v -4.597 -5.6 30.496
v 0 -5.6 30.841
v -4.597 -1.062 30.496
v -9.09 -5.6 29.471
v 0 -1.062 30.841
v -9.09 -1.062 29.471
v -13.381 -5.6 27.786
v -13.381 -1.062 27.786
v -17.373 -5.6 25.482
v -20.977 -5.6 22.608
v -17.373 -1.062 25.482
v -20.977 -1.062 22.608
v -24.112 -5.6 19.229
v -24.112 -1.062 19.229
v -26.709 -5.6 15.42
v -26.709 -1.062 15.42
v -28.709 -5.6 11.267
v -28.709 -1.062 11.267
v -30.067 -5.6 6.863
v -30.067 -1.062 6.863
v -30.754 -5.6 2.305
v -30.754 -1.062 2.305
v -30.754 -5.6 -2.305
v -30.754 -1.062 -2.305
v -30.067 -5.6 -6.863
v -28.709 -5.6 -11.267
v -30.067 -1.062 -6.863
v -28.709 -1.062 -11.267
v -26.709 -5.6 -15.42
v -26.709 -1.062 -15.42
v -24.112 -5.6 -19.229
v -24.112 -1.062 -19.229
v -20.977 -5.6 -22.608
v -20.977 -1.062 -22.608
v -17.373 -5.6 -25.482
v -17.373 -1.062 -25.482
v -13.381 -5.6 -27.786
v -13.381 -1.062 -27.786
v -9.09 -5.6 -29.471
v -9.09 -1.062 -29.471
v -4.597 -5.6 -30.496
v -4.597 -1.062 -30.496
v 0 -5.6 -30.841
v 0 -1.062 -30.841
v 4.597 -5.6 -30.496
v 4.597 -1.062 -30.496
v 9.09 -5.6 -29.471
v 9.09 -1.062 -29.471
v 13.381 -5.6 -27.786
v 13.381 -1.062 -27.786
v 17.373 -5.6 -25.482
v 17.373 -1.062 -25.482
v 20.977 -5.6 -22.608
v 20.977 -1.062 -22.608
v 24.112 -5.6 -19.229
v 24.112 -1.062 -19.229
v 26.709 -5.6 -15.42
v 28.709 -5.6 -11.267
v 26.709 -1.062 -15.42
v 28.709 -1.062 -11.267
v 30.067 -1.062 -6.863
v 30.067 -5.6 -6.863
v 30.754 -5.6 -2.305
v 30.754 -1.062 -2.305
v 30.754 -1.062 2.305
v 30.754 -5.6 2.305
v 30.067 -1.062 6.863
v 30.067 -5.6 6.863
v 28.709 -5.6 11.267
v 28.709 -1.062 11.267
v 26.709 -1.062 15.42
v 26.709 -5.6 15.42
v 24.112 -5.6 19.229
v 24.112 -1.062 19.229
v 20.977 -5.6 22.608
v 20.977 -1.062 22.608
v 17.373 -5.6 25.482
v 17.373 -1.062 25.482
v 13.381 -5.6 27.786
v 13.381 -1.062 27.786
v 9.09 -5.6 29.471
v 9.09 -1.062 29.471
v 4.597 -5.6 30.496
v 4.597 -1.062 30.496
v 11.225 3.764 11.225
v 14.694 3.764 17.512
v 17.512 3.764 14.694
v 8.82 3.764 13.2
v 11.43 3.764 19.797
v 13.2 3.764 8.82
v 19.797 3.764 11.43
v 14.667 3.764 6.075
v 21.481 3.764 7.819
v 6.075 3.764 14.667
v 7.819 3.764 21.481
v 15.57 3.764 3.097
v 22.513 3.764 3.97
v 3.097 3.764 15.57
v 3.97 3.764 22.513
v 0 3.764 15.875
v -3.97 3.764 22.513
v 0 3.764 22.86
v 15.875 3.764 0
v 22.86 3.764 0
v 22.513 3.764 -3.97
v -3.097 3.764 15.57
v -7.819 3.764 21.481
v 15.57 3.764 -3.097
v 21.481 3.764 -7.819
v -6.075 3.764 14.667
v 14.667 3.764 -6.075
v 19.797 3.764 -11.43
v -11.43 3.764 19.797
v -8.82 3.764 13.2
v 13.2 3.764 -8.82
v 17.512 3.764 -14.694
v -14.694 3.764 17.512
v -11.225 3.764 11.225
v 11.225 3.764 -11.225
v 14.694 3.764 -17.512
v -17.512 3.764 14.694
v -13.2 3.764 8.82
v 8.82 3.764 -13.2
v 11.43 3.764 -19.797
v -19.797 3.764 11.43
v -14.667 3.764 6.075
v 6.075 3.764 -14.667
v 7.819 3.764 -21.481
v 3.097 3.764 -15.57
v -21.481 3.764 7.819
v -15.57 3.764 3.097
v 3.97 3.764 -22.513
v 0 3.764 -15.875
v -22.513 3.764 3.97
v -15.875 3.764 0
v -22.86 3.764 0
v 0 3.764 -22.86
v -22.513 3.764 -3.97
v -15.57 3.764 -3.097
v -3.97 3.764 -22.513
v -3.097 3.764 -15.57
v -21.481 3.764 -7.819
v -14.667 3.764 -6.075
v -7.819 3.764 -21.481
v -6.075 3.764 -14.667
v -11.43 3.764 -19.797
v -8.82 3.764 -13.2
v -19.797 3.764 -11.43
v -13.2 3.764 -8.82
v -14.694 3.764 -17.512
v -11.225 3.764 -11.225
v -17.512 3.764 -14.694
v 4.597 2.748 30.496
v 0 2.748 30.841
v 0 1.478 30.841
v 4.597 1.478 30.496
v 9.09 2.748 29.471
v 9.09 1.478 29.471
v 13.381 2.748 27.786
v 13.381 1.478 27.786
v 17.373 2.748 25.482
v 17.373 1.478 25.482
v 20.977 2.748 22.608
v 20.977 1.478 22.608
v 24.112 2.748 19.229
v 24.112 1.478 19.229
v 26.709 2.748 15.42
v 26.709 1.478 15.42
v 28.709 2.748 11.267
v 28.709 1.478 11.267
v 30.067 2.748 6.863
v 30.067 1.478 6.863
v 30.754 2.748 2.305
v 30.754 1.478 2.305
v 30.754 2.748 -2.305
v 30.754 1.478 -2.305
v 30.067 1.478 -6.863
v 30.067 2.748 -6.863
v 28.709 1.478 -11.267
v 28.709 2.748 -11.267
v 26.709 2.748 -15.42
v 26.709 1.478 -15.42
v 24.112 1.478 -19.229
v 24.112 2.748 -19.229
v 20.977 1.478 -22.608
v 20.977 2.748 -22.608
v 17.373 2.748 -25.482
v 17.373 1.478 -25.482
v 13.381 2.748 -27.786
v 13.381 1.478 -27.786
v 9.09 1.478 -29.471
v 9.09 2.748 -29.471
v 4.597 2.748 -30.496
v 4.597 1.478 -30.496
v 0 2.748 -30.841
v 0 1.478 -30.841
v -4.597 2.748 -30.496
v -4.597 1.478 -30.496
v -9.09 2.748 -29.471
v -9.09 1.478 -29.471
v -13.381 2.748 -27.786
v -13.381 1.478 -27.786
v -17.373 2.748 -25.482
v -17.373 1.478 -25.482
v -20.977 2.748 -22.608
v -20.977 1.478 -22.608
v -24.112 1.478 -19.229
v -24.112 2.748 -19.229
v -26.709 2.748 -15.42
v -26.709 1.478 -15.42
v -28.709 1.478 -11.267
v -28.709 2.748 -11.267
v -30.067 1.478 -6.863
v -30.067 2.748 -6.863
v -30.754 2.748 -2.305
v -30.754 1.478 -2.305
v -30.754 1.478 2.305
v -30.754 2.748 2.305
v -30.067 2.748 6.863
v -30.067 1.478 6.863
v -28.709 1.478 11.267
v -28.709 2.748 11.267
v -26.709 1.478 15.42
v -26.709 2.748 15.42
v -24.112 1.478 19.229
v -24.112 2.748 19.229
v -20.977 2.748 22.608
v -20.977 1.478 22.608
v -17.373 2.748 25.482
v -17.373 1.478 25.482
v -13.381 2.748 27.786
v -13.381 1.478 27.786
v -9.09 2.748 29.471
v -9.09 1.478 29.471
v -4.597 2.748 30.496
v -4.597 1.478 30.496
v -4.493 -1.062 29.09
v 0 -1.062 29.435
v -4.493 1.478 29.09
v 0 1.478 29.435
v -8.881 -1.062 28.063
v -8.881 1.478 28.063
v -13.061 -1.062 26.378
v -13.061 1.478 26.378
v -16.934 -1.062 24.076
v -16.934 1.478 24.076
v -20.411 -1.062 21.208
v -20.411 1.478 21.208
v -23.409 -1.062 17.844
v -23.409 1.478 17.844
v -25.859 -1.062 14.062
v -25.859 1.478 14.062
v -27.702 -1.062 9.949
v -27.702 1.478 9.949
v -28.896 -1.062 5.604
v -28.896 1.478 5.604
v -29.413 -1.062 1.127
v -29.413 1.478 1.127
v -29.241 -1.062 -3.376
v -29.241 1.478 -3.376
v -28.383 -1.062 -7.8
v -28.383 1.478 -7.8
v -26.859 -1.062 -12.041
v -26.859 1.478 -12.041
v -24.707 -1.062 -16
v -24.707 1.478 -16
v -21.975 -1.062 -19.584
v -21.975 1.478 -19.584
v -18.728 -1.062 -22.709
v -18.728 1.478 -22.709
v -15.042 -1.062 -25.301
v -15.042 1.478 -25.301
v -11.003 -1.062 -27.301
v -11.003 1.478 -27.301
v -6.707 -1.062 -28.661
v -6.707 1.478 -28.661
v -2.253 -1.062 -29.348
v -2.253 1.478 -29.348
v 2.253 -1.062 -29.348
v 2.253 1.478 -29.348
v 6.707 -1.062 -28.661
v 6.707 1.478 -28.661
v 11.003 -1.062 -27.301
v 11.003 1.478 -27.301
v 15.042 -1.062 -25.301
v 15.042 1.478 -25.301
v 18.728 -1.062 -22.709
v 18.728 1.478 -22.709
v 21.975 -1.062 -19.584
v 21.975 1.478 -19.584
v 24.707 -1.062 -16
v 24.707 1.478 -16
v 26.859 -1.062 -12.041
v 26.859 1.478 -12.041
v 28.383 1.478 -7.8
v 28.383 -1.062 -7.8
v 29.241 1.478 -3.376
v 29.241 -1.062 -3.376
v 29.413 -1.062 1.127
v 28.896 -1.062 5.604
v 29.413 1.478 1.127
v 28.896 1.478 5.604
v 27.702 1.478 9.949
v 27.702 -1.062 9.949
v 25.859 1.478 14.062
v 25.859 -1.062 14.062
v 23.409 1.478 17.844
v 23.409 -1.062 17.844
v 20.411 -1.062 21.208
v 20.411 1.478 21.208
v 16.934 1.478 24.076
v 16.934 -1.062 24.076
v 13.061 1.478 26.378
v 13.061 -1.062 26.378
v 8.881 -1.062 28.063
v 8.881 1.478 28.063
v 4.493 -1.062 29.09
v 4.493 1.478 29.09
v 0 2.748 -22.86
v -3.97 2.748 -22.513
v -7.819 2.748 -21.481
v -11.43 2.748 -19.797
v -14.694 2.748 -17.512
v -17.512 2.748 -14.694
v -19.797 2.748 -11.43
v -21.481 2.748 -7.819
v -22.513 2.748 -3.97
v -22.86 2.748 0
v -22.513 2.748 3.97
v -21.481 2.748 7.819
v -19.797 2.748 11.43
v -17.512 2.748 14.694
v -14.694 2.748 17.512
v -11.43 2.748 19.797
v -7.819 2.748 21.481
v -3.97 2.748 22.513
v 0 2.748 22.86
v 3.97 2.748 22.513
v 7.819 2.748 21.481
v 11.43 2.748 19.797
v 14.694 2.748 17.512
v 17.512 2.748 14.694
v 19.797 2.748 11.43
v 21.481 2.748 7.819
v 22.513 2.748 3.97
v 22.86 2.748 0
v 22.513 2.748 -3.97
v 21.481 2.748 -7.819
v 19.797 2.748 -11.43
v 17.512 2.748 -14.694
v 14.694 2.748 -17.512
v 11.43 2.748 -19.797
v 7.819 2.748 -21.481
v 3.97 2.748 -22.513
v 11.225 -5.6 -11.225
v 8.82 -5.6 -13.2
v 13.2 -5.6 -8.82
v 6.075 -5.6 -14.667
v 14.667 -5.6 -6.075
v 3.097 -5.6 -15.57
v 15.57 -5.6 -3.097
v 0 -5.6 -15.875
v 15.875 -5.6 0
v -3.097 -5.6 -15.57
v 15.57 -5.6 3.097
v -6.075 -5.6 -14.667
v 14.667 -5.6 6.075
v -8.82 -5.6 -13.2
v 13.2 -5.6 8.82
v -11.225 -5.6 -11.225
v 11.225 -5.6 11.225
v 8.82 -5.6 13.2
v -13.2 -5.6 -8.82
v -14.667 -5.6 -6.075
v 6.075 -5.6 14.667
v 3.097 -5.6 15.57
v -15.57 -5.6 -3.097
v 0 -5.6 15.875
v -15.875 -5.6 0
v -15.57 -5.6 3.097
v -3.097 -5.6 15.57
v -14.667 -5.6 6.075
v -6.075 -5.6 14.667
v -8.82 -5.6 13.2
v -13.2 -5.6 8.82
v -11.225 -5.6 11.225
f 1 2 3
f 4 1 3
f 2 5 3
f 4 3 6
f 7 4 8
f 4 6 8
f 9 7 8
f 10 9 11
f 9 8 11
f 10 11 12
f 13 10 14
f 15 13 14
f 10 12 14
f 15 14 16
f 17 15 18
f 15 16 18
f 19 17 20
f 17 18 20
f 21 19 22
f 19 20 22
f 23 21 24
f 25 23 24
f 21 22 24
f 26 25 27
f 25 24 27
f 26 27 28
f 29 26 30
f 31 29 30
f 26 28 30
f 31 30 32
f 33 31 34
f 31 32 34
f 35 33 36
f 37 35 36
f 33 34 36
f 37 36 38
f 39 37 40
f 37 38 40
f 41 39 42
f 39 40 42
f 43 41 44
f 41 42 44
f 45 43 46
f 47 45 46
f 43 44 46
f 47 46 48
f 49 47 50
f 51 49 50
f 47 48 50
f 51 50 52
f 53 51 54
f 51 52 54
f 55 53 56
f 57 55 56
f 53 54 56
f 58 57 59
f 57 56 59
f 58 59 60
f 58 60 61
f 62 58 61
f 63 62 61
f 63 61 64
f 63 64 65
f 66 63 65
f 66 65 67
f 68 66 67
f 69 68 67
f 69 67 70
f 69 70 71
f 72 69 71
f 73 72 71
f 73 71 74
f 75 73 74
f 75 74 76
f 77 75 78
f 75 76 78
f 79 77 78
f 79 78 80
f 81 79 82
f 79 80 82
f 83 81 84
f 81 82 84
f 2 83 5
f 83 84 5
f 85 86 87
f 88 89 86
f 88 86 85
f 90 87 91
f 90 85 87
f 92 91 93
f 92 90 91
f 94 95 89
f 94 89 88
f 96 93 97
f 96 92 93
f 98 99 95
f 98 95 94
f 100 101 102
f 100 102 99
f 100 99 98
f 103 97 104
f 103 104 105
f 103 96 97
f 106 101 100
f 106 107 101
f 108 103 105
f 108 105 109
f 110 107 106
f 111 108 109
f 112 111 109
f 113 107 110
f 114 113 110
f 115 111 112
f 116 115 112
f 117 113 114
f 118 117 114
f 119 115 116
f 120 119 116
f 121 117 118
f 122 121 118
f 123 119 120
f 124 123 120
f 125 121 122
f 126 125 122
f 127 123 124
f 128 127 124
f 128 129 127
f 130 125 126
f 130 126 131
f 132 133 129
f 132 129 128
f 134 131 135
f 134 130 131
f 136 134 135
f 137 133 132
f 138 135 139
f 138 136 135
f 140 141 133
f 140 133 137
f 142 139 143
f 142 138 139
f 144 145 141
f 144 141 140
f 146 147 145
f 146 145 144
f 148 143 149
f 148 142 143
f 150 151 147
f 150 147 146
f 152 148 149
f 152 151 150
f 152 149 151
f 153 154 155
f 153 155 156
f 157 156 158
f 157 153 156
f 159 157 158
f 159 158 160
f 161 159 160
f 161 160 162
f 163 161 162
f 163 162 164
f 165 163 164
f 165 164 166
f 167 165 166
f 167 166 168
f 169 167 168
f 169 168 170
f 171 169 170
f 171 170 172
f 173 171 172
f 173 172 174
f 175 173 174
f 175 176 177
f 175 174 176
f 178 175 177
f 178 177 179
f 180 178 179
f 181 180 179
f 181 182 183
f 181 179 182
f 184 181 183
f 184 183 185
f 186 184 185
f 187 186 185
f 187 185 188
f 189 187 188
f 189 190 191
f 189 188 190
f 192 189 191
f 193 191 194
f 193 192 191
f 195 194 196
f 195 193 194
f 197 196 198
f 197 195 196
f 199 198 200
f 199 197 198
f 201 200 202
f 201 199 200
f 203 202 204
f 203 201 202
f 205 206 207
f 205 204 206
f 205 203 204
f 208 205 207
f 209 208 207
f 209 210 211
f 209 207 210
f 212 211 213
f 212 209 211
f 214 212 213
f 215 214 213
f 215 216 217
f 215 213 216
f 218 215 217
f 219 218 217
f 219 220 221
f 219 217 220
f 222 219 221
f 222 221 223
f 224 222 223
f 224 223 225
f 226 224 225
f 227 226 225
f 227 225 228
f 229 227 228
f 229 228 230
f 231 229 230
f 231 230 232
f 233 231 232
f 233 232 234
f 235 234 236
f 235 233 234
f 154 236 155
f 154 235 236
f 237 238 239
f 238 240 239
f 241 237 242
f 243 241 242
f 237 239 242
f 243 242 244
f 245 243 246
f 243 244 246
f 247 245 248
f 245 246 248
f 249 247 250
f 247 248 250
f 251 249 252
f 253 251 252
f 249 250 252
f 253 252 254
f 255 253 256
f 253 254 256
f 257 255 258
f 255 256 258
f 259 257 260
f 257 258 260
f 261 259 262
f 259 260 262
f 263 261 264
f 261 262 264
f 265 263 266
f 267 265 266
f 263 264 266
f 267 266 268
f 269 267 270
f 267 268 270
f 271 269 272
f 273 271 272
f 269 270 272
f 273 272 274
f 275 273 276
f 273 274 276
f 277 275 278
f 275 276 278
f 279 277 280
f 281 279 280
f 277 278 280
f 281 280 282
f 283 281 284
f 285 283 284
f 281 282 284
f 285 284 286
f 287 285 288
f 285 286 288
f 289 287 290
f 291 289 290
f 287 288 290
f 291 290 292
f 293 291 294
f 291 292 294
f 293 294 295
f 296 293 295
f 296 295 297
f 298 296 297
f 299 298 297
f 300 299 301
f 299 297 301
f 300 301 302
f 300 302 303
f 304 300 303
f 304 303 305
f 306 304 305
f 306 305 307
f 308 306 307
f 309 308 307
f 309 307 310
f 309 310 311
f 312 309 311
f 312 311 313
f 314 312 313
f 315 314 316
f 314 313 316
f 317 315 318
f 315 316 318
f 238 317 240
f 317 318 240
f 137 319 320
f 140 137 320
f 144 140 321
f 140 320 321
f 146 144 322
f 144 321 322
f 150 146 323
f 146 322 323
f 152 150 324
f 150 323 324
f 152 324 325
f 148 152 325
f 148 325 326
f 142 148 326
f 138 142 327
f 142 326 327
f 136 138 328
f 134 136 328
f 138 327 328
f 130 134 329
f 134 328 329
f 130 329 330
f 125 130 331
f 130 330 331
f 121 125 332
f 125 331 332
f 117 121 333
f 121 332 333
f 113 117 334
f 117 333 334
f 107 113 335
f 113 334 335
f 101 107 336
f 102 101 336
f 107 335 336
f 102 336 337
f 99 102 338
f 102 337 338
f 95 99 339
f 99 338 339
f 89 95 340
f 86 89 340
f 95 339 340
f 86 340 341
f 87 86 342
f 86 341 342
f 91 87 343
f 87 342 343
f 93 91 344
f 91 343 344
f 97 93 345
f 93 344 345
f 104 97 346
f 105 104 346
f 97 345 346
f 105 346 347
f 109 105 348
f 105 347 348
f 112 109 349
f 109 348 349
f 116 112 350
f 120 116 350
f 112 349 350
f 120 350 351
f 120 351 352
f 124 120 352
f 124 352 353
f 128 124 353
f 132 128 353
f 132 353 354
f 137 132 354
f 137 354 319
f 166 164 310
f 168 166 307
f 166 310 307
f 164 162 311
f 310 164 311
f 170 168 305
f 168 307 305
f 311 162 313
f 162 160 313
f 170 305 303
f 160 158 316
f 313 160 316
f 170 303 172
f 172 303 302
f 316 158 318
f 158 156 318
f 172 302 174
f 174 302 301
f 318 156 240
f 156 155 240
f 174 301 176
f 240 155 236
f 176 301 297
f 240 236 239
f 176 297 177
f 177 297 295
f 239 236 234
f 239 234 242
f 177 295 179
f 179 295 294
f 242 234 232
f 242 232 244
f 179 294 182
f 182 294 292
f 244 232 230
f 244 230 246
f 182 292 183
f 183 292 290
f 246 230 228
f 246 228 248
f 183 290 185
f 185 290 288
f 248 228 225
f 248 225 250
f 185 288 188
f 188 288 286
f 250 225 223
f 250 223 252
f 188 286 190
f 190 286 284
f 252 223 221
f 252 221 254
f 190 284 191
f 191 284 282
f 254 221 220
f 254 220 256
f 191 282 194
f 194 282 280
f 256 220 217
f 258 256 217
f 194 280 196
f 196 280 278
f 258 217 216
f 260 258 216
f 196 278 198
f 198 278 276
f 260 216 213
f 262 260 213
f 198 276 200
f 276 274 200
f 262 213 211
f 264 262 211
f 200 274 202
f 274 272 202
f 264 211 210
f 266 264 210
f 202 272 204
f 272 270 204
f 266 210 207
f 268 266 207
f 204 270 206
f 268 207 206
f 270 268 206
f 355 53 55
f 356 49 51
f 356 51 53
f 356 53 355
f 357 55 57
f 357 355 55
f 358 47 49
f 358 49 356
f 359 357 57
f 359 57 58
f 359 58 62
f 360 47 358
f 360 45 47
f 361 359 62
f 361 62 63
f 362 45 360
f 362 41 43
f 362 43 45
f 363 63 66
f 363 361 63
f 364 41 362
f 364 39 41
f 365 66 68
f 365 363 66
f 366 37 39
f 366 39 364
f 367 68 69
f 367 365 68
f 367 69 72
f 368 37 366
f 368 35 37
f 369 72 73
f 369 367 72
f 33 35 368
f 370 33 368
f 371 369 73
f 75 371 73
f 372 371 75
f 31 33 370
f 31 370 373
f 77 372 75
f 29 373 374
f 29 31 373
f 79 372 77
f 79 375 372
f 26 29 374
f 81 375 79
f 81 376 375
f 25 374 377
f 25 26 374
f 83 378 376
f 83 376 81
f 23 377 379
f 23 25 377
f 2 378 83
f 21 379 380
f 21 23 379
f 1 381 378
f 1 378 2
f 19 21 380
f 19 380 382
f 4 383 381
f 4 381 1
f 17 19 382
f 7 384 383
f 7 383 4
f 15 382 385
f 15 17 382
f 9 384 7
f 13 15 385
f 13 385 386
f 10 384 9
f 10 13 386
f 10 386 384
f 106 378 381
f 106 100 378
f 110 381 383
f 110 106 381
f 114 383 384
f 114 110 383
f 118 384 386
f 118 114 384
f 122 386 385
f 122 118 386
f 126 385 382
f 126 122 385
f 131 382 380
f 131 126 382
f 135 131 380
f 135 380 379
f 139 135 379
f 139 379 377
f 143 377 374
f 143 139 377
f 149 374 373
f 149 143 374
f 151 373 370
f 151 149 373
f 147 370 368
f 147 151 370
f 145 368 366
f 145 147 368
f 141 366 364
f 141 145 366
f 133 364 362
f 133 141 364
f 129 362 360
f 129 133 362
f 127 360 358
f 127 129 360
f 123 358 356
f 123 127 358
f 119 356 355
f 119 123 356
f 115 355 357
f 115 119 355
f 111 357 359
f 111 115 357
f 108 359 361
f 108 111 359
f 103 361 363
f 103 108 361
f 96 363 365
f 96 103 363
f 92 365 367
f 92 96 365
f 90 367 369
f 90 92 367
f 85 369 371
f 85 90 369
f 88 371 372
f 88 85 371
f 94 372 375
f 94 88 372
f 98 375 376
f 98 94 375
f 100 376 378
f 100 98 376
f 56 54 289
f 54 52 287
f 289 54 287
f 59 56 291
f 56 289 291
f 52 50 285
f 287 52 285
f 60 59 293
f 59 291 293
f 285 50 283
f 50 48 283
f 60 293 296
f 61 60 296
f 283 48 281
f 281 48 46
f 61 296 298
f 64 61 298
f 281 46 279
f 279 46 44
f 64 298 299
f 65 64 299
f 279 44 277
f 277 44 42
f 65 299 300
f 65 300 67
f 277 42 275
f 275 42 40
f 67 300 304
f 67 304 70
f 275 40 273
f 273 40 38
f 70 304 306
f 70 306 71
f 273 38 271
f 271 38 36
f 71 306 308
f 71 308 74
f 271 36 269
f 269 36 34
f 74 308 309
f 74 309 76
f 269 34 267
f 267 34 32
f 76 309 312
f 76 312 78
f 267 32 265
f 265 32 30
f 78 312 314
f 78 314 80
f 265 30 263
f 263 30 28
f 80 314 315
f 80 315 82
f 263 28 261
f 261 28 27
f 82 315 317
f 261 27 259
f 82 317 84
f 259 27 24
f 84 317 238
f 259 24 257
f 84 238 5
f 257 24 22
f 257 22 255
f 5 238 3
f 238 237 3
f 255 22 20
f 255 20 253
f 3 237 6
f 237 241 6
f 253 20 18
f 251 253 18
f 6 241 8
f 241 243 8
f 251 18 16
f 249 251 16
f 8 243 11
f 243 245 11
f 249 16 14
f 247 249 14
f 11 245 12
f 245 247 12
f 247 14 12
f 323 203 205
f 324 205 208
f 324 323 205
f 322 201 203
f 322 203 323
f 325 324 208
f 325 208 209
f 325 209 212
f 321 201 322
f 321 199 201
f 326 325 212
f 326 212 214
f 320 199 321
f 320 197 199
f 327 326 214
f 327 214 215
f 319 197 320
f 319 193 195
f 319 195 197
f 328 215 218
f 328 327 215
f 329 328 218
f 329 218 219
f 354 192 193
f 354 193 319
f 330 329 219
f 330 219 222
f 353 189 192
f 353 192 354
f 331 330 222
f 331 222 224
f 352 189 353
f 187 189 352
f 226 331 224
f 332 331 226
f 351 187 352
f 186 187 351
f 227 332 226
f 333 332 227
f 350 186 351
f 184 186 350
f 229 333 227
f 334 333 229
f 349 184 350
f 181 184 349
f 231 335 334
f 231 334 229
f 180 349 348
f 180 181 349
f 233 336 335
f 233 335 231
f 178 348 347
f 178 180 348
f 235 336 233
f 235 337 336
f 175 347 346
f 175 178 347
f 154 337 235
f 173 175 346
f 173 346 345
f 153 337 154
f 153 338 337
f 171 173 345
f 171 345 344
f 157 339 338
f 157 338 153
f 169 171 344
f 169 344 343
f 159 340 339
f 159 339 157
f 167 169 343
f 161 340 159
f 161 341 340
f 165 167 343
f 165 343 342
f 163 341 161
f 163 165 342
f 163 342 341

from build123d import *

# Parameters (mm, degrees)
BANDAID_START                  = 0.053848
SKETCH3_R                      = 30.84068
SKETCH3_R_2                    = 15.875
BANDAID_SOLUTION_THICKER_DEPTH = 0.053848
SKETCH4_R                      = 22.86
SKETCH4_R_2                    = 15.875
LIP_FOR_BEARING_DEPTH          = 1.016
SKETCH5_R                      = 30.84068
SKETCH5_R_2                    = 15.875
BOSS_EXTRUDE1_DEPTH            = 0.57912


with BuildPart() as part:
    # Sketch1 → Revolve1 (revolve)
    with BuildSketch(Plane(origin=(0, 0, 0), x_dir=(0, 0, -1), z_dir=(1, 0, 0))):
        Polygon((-15.875, 2.694084), (-15.875, -5.020818), (-30.84068, -5.020818), (-30.84068, -1.062068), (-29.43479, -1.062068), (-29.43479, 1.477932), (-30.84068, 1.477932), (-30.84068, 2.694084), align=None)
    revolve(axis=Axis((0, 0, 0), (0, -1, 0)))

    # Sketch3 → BandAid Solution thicker (add)
    with BuildSketch(Plane(origin=(0, 2.694084, 0), x_dir=(1, 0, 0), z_dir=(0, 1, 0)).offset(BANDAID_START)):
        with Locations(Location((0, 0, 0), (0, 0, 270))):
            Circle(SKETCH3_R)
        with Locations(Location((0, 0, 0), (0, 0, 270))):
            Circle(SKETCH3_R_2, mode=Mode.SUBTRACT)
    extrude(amount=-BANDAID_SOLUTION_THICKER_DEPTH)

    # Sketch4 → Lip for Bearing (add)
    with BuildSketch(Plane(origin=(0, 2.747932, 0), x_dir=(1, 0, 0), z_dir=(0, 1, 0))):
        with Locations(Location((0, 0, 0), (0, 0, 90))):
            Circle(SKETCH4_R)
        with Locations(Location((0, 0, 0), (0, 0, 270))):
            Circle(SKETCH4_R_2, mode=Mode.SUBTRACT)
    extrude(amount=LIP_FOR_BEARING_DEPTH)

    # Sketch5 → Boss-Extrude1 (add)
    with BuildSketch(Plane.XZ.offset(5.020818)):
        with Locations(Location((0, 0, 0), (0, 0, 90))):
            Circle(SKETCH5_R)
        with Locations(Location((0, 0, 0), (0, 0, 90))):
            Circle(SKETCH5_R_2, mode=Mode.SUBTRACT)
    extrude(amount=BOSS_EXTRUDE1_DEPTH)


solid = part.part
